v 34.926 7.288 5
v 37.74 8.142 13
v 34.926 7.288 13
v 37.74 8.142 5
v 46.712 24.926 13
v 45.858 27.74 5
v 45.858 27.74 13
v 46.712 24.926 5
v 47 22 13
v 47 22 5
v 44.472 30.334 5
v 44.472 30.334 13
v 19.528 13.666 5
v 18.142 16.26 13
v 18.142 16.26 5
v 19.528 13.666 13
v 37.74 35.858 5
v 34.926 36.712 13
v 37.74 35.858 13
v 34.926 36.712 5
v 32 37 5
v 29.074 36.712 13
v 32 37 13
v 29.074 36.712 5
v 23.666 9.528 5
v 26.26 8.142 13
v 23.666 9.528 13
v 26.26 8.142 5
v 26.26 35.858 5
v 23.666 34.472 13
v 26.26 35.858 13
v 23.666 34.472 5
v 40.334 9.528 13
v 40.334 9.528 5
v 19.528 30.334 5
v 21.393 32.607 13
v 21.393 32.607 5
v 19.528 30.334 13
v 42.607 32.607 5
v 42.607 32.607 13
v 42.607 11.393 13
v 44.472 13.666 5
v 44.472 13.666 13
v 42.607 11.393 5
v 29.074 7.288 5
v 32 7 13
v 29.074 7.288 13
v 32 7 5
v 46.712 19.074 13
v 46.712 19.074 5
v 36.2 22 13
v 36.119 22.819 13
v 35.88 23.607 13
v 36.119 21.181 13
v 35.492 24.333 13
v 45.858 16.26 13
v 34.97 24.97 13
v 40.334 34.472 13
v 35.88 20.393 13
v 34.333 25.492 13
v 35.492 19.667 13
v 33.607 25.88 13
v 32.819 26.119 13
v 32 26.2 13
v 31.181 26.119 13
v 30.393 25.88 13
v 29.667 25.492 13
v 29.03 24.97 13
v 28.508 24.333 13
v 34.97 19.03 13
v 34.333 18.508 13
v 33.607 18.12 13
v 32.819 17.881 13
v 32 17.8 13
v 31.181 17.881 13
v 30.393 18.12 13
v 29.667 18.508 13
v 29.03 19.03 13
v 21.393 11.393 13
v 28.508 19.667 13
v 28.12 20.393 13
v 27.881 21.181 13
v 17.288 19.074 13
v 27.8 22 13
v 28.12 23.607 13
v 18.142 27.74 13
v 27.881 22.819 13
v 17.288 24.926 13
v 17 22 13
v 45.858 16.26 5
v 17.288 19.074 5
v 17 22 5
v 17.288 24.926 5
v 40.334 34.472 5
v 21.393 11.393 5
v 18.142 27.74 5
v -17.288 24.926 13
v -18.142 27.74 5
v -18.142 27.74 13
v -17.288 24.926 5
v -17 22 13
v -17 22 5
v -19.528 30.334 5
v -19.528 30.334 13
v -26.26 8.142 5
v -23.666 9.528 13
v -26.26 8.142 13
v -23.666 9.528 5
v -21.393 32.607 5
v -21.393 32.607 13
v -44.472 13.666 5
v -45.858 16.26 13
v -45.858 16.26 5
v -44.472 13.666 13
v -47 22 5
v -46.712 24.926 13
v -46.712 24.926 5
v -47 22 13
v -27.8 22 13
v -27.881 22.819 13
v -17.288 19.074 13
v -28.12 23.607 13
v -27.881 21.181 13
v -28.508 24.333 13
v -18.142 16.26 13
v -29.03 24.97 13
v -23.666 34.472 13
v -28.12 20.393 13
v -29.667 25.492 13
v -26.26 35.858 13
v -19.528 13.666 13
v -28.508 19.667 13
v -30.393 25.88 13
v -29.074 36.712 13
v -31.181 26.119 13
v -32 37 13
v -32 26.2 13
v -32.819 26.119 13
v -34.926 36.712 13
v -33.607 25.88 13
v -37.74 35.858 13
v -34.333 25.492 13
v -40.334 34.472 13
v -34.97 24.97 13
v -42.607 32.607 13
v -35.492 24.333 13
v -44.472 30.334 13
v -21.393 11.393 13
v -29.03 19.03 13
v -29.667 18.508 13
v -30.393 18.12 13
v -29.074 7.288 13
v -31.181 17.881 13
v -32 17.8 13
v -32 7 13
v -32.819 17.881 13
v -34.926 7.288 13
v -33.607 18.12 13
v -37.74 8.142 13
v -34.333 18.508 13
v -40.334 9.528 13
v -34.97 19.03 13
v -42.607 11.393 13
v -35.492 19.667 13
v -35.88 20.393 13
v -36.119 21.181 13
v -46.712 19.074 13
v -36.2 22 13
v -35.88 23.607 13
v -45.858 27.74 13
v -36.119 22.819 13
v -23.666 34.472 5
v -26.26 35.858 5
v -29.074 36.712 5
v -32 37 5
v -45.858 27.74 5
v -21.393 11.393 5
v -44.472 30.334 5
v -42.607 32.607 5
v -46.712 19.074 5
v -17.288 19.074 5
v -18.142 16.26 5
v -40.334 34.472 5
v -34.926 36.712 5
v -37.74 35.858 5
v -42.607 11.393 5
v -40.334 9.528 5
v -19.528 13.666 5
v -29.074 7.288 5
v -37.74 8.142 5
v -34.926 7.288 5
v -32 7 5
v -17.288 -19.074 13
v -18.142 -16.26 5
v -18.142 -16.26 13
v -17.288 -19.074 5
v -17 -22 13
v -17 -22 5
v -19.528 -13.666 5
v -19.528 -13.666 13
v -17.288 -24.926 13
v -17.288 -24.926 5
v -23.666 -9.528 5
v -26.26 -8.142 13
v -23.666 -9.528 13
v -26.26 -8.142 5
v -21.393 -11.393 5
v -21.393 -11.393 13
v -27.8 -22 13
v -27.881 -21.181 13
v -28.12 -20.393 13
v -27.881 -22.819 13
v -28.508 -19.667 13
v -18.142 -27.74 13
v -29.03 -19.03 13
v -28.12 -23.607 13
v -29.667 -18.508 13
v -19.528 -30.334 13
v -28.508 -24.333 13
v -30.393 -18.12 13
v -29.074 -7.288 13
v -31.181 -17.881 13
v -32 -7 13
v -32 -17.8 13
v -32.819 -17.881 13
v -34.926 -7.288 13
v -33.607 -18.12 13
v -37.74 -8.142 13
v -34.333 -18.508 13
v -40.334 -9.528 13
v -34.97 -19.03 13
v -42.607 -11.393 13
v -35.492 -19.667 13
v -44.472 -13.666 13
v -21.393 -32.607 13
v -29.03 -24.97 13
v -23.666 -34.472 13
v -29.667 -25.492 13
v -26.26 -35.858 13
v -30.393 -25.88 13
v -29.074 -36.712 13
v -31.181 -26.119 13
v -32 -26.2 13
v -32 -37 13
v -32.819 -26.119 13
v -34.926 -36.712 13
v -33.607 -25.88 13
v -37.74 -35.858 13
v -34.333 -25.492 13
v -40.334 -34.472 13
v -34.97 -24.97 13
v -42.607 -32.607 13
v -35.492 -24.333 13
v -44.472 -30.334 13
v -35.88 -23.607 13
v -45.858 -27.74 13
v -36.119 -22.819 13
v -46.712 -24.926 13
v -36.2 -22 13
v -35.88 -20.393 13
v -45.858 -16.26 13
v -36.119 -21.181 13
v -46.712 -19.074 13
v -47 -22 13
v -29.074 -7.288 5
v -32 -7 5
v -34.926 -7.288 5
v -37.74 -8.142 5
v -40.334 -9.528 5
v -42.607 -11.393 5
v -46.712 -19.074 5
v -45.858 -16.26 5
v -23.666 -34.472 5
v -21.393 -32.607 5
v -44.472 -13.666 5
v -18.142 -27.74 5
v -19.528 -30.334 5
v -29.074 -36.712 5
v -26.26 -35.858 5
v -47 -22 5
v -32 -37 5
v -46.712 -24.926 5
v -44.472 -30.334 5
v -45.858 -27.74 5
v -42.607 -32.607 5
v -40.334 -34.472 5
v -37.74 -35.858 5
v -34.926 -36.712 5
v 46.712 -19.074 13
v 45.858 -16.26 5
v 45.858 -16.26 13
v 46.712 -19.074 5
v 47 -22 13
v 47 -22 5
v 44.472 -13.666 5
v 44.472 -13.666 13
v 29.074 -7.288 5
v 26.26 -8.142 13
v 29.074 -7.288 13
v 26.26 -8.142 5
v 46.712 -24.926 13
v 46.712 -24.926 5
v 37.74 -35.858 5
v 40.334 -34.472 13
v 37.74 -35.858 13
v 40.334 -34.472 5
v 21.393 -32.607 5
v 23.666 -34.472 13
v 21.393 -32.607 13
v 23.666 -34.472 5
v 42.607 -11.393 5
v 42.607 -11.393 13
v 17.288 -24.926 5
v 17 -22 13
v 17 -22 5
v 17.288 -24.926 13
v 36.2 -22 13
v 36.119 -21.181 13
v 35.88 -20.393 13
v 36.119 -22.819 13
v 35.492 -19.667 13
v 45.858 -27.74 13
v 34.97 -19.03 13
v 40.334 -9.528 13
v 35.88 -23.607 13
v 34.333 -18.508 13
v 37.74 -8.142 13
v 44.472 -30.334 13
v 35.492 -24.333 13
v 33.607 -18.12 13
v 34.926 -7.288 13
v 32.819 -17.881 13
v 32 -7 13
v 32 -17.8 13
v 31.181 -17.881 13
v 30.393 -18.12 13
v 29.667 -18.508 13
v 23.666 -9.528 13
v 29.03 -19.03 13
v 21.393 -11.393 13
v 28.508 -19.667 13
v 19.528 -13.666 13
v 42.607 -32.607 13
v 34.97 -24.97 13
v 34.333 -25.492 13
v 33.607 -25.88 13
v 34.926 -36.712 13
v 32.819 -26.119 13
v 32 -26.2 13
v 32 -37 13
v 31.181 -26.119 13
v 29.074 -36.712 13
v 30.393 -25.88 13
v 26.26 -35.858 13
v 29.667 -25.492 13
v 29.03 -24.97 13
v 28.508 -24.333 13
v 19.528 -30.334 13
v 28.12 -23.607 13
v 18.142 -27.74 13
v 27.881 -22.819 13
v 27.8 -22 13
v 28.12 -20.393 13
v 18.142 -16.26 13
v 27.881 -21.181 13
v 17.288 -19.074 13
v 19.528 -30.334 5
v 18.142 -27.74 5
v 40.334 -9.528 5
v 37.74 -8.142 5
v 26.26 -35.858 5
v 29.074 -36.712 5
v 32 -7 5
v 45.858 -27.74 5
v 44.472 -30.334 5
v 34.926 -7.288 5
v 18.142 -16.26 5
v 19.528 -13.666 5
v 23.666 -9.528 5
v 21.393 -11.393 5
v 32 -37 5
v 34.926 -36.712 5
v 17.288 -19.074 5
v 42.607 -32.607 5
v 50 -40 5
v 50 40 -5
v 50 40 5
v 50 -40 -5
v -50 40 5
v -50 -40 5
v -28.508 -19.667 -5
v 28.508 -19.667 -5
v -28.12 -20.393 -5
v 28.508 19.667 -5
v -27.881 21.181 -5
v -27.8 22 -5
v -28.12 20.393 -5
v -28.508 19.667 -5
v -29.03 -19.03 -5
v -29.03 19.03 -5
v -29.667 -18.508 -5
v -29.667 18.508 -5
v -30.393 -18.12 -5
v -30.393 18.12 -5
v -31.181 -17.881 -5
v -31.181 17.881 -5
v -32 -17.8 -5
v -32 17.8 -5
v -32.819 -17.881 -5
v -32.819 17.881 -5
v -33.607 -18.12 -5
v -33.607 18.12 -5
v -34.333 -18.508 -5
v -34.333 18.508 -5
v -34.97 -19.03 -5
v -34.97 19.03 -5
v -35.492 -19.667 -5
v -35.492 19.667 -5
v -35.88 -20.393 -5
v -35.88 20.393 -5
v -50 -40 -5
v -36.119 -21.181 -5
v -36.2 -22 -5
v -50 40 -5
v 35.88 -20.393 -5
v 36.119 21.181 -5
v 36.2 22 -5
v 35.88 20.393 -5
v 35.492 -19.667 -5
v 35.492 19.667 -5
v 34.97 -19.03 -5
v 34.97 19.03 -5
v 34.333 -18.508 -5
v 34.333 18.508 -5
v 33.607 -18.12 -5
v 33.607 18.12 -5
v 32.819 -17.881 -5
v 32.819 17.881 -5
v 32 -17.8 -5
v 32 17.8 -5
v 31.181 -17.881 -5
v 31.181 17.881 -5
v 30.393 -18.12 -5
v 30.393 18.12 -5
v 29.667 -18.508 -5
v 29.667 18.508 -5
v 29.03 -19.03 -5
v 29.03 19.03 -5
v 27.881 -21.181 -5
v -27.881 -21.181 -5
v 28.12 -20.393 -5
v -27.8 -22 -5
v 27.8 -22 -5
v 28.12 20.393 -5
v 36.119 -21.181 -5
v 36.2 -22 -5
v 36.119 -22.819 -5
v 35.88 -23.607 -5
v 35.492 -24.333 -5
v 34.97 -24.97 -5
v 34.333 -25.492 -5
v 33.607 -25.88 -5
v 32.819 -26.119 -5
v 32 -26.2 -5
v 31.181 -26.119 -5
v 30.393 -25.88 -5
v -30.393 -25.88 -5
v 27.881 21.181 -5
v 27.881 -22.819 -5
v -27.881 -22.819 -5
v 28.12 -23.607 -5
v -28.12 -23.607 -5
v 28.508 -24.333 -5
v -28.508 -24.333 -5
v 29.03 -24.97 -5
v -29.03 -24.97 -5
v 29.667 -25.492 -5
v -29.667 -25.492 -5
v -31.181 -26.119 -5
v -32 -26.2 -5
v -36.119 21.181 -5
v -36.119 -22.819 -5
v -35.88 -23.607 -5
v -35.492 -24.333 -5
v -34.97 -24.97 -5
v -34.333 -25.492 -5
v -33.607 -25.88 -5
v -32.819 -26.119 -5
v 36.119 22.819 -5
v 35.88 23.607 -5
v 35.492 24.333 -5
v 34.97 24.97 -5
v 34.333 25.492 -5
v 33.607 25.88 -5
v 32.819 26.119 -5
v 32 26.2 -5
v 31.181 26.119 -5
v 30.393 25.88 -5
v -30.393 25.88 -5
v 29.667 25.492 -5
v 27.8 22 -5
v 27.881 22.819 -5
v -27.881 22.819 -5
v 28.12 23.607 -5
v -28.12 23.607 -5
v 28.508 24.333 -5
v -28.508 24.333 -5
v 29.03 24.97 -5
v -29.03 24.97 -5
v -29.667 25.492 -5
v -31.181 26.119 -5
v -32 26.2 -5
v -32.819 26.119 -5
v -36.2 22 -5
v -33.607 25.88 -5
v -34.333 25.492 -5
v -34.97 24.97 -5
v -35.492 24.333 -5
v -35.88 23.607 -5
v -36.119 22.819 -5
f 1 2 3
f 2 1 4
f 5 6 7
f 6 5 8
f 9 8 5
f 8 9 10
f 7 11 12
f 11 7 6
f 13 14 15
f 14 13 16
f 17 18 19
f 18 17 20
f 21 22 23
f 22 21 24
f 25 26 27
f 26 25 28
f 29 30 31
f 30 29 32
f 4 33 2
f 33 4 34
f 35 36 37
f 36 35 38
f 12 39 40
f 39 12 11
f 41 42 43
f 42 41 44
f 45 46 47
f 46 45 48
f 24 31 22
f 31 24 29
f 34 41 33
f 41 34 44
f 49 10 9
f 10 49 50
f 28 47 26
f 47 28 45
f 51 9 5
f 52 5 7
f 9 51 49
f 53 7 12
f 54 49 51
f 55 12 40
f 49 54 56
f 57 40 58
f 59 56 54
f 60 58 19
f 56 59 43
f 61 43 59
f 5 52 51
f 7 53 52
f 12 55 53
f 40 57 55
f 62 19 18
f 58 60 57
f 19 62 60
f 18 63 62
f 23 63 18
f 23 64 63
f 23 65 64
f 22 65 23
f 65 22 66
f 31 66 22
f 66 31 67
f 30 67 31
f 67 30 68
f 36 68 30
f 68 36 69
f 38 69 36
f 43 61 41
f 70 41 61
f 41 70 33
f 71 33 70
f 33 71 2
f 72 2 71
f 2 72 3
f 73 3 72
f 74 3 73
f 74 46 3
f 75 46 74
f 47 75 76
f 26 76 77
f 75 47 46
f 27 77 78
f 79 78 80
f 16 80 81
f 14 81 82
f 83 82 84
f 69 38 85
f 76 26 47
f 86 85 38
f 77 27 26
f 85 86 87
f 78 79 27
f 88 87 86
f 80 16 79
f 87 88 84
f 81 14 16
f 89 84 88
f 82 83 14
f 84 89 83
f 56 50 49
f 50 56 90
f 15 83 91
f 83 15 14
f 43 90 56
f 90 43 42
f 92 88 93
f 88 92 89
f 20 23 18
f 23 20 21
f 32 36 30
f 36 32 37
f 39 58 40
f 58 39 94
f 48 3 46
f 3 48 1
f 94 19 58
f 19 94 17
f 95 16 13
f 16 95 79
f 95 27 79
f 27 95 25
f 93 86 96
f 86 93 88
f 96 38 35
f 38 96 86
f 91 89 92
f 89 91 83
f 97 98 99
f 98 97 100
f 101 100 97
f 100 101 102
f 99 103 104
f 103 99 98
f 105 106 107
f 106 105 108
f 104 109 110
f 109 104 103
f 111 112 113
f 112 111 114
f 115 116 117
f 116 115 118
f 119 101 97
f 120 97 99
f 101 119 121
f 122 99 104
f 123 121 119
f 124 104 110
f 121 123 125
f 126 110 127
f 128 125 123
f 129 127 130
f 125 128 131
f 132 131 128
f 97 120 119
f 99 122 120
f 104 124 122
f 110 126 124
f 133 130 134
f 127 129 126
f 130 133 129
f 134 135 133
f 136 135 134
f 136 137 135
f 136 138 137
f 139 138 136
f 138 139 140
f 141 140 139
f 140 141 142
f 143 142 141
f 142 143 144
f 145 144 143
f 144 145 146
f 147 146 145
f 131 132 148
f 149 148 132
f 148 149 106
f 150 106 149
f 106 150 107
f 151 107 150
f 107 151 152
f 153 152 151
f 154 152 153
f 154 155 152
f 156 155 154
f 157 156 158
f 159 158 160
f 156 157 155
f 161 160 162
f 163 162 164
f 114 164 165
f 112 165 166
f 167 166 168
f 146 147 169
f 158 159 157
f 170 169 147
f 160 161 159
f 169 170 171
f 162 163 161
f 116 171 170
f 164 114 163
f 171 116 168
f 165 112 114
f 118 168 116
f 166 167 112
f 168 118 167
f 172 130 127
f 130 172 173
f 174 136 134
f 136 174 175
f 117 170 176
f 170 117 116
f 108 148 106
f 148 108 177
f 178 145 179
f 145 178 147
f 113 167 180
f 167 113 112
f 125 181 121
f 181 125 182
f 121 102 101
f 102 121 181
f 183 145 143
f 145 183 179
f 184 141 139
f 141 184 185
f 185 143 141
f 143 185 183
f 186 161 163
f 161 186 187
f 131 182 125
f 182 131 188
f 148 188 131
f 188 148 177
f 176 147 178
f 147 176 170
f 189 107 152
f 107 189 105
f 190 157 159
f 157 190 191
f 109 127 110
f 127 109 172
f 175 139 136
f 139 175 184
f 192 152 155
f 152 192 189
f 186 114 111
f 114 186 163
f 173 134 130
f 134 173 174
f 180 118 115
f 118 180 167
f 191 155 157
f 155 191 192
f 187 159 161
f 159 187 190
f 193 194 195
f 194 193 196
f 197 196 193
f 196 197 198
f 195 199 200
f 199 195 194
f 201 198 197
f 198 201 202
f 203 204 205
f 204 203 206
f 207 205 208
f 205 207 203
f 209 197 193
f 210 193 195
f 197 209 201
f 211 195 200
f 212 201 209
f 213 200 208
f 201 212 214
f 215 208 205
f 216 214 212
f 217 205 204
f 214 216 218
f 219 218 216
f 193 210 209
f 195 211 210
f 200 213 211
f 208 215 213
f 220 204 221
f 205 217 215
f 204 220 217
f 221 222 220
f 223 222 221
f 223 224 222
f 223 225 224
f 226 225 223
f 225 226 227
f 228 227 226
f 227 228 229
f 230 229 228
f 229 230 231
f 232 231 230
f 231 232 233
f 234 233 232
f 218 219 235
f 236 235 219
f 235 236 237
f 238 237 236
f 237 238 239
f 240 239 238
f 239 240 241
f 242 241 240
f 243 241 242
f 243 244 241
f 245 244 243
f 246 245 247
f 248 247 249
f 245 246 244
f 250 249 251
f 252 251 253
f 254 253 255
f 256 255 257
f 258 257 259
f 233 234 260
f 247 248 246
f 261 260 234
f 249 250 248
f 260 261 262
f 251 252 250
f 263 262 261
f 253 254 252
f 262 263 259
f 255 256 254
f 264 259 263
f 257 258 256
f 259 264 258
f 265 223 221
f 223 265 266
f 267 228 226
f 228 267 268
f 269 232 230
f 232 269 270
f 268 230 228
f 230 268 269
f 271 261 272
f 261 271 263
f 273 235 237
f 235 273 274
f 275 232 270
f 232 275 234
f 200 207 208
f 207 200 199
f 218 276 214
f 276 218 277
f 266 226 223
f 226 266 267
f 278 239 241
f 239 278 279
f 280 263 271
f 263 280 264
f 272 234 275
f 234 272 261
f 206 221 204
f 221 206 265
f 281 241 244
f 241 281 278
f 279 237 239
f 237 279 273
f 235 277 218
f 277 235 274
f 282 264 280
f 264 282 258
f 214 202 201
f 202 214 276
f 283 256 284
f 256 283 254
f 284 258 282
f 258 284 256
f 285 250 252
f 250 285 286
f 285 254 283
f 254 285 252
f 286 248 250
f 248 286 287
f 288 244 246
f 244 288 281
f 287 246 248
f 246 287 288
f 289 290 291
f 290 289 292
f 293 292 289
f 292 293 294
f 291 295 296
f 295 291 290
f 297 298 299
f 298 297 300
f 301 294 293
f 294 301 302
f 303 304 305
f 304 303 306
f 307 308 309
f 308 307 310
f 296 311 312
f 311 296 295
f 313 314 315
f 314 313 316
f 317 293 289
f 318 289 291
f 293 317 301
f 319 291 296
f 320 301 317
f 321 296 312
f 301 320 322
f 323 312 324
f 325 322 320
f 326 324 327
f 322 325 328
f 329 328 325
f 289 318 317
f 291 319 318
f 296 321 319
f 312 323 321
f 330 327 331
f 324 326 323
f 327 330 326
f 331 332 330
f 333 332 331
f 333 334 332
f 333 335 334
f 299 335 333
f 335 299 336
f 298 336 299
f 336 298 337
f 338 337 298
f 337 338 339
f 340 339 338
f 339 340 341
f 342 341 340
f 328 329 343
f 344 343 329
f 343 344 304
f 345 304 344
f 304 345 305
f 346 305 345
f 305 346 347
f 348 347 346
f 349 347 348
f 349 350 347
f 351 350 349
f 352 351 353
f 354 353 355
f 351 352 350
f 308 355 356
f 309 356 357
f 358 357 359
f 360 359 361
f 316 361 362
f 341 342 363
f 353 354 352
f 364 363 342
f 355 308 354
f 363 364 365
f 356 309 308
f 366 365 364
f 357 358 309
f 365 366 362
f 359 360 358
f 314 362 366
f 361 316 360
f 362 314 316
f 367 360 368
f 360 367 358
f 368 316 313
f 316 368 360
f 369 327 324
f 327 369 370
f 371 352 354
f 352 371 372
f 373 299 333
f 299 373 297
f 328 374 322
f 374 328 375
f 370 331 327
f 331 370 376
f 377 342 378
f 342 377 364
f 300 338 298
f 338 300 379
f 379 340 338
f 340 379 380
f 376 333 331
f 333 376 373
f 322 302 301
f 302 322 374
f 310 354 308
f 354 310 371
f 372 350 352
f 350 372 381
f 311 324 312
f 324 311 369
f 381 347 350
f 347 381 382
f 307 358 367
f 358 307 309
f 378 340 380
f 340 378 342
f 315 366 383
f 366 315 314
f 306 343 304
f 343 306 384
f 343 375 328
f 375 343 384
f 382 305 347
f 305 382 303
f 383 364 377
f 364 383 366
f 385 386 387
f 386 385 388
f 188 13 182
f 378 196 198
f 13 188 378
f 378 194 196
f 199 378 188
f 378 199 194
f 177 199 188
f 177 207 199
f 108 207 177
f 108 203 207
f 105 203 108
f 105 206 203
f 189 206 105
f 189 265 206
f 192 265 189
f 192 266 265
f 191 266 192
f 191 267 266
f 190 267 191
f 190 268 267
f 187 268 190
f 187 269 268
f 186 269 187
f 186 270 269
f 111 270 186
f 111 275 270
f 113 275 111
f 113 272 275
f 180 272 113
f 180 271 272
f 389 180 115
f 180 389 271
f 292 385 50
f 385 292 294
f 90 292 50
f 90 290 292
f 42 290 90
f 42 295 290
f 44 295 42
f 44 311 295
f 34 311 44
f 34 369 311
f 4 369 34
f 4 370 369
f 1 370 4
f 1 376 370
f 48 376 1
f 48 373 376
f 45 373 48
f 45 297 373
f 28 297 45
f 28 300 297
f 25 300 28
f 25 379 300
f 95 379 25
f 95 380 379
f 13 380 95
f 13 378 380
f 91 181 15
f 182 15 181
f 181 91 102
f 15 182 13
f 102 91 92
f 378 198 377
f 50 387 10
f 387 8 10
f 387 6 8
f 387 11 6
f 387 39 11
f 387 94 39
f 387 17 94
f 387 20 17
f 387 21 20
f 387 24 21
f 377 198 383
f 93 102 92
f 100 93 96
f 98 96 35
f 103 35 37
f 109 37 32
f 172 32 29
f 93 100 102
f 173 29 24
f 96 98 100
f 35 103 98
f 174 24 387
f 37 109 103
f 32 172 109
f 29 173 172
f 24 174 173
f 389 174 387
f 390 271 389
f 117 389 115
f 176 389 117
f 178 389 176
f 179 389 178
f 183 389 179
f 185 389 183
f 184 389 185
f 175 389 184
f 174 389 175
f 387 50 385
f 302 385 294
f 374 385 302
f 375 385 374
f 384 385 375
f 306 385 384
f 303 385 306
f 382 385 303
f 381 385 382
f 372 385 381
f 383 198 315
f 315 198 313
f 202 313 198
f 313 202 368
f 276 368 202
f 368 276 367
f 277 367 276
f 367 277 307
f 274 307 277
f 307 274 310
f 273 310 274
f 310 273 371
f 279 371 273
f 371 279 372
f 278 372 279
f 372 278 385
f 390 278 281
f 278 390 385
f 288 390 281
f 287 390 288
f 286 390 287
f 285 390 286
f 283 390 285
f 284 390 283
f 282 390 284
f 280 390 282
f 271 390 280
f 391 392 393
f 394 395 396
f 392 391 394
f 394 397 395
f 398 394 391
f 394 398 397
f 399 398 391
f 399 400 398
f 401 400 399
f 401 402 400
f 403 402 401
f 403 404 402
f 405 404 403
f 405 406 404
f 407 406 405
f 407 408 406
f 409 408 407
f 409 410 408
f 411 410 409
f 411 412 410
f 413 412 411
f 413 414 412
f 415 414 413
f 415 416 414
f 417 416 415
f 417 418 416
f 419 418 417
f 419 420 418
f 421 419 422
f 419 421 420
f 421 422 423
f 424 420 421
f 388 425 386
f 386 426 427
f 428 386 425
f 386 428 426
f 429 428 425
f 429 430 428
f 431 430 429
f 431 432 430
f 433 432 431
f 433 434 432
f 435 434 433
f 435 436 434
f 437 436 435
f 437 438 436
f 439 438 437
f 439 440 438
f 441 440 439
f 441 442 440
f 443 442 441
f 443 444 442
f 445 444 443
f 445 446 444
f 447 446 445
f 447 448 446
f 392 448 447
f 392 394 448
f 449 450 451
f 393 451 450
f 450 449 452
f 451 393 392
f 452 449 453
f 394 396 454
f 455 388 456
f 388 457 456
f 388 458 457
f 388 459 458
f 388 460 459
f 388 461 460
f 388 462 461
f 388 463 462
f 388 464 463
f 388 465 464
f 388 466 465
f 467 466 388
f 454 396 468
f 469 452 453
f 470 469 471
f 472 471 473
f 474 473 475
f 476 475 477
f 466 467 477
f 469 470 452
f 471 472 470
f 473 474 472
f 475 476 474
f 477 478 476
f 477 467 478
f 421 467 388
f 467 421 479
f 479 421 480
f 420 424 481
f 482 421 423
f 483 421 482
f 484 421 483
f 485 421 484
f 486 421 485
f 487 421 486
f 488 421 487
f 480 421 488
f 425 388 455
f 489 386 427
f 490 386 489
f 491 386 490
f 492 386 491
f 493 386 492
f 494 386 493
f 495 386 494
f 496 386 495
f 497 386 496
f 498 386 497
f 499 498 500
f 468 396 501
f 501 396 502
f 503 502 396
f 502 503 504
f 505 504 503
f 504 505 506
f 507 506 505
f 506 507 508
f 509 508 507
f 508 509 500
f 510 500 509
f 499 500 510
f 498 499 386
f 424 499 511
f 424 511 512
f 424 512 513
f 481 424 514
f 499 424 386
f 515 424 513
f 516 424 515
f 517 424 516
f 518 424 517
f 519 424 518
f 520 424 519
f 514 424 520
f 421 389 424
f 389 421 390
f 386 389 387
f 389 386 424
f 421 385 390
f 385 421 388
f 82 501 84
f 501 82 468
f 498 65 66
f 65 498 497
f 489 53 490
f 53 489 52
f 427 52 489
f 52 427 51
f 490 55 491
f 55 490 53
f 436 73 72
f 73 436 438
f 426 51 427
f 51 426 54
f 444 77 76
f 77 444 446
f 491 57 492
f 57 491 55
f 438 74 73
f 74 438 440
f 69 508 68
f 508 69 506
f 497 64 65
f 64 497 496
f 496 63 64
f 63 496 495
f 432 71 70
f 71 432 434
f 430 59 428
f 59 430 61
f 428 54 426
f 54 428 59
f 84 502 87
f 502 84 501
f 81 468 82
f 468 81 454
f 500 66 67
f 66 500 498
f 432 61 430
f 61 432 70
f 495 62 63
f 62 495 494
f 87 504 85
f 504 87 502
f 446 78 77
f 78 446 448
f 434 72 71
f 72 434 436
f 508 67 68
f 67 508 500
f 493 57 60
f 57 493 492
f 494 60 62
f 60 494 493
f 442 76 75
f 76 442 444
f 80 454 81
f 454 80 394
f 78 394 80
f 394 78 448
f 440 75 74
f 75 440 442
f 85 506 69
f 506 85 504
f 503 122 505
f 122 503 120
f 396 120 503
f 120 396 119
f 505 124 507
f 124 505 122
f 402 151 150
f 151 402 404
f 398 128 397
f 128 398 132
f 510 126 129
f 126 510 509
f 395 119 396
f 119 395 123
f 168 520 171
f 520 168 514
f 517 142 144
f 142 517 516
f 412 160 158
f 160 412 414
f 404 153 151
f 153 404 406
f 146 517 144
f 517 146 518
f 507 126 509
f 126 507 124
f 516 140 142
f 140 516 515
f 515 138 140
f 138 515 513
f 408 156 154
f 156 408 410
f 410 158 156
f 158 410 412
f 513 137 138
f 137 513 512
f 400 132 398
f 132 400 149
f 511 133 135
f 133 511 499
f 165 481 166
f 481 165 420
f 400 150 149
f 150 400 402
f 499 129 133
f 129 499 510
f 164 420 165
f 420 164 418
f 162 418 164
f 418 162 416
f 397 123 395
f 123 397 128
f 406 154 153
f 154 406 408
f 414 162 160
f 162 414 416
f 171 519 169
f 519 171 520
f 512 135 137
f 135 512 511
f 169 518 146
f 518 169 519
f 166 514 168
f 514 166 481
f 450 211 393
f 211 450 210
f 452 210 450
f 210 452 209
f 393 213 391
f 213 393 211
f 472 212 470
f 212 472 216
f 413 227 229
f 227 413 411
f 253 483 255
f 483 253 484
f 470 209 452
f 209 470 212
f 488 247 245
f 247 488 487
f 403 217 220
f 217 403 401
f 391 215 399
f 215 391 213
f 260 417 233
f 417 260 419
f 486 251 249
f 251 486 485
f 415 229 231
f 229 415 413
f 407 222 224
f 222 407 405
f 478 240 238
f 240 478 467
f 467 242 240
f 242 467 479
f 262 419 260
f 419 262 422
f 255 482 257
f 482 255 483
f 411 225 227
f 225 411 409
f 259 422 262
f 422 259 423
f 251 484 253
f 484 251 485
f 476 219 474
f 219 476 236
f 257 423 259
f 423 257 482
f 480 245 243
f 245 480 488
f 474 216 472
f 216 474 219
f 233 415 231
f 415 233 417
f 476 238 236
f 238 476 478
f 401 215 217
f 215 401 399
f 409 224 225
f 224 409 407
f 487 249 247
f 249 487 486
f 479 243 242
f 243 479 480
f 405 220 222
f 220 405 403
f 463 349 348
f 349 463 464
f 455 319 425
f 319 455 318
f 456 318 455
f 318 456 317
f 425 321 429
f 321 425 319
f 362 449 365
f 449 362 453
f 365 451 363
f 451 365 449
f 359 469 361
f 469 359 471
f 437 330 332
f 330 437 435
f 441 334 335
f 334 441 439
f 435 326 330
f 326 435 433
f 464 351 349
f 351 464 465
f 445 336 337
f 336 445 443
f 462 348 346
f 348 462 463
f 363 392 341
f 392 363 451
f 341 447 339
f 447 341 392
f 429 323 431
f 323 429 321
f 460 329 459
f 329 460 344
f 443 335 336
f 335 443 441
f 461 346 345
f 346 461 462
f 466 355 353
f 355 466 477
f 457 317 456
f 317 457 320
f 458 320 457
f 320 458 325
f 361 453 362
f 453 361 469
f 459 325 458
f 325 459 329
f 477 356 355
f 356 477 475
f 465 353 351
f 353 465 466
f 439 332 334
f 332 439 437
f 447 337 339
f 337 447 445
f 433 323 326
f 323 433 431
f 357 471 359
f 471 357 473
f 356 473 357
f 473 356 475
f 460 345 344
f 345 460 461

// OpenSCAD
$fn = 32;

// ----------------------------------------------------------------------
// Anchor pads 100 x 80 x 18
// four corner bosses with anchor holes
// ----------------------------------------------------------------------

// --- parameters (mm) ---
plate = [100, 80, 10];  // base plate size (x, y, z)
pads = 4;               // boss count, one per corner
edge = 18;              // boss centre offset from the plate edge
boss_d = 30;            // boss diameter
boss_h = 8;             // boss height above the base plate
hole_d = 8.4;           // hole diameter

// --- derived feature positions (mm) ---
height = plate[2] + boss_h;      // = 18   overall height of the part
corner_x = plate[0] / 2 - edge;  // = 32   boss centre X
corner_y = plate[1] / 2 - edge;  // = 22   boss centre Y
feature_centers = [
  [corner_x, corner_y],
  [-corner_x, corner_y],
  [-corner_x, -corner_y],
  [corner_x, -corner_y]
];   // boss centres, anchor holes are drilled there

// base plate, four bosses standing on it, anchor holes all the way through
difference() {
  union() {
    cube(plate, center = true);
    for (centre = feature_centers)
      translate([centre[0], centre[1], plate[2] / 2 - 1])
        cylinder(d = boss_d, h = boss_h + 1);
  }
  for (centre = feature_centers)
    translate([centre[0], centre[1], -height])
      cylinder(d = hole_d, h = 2 * height + 2);  // through boss and plate
}
